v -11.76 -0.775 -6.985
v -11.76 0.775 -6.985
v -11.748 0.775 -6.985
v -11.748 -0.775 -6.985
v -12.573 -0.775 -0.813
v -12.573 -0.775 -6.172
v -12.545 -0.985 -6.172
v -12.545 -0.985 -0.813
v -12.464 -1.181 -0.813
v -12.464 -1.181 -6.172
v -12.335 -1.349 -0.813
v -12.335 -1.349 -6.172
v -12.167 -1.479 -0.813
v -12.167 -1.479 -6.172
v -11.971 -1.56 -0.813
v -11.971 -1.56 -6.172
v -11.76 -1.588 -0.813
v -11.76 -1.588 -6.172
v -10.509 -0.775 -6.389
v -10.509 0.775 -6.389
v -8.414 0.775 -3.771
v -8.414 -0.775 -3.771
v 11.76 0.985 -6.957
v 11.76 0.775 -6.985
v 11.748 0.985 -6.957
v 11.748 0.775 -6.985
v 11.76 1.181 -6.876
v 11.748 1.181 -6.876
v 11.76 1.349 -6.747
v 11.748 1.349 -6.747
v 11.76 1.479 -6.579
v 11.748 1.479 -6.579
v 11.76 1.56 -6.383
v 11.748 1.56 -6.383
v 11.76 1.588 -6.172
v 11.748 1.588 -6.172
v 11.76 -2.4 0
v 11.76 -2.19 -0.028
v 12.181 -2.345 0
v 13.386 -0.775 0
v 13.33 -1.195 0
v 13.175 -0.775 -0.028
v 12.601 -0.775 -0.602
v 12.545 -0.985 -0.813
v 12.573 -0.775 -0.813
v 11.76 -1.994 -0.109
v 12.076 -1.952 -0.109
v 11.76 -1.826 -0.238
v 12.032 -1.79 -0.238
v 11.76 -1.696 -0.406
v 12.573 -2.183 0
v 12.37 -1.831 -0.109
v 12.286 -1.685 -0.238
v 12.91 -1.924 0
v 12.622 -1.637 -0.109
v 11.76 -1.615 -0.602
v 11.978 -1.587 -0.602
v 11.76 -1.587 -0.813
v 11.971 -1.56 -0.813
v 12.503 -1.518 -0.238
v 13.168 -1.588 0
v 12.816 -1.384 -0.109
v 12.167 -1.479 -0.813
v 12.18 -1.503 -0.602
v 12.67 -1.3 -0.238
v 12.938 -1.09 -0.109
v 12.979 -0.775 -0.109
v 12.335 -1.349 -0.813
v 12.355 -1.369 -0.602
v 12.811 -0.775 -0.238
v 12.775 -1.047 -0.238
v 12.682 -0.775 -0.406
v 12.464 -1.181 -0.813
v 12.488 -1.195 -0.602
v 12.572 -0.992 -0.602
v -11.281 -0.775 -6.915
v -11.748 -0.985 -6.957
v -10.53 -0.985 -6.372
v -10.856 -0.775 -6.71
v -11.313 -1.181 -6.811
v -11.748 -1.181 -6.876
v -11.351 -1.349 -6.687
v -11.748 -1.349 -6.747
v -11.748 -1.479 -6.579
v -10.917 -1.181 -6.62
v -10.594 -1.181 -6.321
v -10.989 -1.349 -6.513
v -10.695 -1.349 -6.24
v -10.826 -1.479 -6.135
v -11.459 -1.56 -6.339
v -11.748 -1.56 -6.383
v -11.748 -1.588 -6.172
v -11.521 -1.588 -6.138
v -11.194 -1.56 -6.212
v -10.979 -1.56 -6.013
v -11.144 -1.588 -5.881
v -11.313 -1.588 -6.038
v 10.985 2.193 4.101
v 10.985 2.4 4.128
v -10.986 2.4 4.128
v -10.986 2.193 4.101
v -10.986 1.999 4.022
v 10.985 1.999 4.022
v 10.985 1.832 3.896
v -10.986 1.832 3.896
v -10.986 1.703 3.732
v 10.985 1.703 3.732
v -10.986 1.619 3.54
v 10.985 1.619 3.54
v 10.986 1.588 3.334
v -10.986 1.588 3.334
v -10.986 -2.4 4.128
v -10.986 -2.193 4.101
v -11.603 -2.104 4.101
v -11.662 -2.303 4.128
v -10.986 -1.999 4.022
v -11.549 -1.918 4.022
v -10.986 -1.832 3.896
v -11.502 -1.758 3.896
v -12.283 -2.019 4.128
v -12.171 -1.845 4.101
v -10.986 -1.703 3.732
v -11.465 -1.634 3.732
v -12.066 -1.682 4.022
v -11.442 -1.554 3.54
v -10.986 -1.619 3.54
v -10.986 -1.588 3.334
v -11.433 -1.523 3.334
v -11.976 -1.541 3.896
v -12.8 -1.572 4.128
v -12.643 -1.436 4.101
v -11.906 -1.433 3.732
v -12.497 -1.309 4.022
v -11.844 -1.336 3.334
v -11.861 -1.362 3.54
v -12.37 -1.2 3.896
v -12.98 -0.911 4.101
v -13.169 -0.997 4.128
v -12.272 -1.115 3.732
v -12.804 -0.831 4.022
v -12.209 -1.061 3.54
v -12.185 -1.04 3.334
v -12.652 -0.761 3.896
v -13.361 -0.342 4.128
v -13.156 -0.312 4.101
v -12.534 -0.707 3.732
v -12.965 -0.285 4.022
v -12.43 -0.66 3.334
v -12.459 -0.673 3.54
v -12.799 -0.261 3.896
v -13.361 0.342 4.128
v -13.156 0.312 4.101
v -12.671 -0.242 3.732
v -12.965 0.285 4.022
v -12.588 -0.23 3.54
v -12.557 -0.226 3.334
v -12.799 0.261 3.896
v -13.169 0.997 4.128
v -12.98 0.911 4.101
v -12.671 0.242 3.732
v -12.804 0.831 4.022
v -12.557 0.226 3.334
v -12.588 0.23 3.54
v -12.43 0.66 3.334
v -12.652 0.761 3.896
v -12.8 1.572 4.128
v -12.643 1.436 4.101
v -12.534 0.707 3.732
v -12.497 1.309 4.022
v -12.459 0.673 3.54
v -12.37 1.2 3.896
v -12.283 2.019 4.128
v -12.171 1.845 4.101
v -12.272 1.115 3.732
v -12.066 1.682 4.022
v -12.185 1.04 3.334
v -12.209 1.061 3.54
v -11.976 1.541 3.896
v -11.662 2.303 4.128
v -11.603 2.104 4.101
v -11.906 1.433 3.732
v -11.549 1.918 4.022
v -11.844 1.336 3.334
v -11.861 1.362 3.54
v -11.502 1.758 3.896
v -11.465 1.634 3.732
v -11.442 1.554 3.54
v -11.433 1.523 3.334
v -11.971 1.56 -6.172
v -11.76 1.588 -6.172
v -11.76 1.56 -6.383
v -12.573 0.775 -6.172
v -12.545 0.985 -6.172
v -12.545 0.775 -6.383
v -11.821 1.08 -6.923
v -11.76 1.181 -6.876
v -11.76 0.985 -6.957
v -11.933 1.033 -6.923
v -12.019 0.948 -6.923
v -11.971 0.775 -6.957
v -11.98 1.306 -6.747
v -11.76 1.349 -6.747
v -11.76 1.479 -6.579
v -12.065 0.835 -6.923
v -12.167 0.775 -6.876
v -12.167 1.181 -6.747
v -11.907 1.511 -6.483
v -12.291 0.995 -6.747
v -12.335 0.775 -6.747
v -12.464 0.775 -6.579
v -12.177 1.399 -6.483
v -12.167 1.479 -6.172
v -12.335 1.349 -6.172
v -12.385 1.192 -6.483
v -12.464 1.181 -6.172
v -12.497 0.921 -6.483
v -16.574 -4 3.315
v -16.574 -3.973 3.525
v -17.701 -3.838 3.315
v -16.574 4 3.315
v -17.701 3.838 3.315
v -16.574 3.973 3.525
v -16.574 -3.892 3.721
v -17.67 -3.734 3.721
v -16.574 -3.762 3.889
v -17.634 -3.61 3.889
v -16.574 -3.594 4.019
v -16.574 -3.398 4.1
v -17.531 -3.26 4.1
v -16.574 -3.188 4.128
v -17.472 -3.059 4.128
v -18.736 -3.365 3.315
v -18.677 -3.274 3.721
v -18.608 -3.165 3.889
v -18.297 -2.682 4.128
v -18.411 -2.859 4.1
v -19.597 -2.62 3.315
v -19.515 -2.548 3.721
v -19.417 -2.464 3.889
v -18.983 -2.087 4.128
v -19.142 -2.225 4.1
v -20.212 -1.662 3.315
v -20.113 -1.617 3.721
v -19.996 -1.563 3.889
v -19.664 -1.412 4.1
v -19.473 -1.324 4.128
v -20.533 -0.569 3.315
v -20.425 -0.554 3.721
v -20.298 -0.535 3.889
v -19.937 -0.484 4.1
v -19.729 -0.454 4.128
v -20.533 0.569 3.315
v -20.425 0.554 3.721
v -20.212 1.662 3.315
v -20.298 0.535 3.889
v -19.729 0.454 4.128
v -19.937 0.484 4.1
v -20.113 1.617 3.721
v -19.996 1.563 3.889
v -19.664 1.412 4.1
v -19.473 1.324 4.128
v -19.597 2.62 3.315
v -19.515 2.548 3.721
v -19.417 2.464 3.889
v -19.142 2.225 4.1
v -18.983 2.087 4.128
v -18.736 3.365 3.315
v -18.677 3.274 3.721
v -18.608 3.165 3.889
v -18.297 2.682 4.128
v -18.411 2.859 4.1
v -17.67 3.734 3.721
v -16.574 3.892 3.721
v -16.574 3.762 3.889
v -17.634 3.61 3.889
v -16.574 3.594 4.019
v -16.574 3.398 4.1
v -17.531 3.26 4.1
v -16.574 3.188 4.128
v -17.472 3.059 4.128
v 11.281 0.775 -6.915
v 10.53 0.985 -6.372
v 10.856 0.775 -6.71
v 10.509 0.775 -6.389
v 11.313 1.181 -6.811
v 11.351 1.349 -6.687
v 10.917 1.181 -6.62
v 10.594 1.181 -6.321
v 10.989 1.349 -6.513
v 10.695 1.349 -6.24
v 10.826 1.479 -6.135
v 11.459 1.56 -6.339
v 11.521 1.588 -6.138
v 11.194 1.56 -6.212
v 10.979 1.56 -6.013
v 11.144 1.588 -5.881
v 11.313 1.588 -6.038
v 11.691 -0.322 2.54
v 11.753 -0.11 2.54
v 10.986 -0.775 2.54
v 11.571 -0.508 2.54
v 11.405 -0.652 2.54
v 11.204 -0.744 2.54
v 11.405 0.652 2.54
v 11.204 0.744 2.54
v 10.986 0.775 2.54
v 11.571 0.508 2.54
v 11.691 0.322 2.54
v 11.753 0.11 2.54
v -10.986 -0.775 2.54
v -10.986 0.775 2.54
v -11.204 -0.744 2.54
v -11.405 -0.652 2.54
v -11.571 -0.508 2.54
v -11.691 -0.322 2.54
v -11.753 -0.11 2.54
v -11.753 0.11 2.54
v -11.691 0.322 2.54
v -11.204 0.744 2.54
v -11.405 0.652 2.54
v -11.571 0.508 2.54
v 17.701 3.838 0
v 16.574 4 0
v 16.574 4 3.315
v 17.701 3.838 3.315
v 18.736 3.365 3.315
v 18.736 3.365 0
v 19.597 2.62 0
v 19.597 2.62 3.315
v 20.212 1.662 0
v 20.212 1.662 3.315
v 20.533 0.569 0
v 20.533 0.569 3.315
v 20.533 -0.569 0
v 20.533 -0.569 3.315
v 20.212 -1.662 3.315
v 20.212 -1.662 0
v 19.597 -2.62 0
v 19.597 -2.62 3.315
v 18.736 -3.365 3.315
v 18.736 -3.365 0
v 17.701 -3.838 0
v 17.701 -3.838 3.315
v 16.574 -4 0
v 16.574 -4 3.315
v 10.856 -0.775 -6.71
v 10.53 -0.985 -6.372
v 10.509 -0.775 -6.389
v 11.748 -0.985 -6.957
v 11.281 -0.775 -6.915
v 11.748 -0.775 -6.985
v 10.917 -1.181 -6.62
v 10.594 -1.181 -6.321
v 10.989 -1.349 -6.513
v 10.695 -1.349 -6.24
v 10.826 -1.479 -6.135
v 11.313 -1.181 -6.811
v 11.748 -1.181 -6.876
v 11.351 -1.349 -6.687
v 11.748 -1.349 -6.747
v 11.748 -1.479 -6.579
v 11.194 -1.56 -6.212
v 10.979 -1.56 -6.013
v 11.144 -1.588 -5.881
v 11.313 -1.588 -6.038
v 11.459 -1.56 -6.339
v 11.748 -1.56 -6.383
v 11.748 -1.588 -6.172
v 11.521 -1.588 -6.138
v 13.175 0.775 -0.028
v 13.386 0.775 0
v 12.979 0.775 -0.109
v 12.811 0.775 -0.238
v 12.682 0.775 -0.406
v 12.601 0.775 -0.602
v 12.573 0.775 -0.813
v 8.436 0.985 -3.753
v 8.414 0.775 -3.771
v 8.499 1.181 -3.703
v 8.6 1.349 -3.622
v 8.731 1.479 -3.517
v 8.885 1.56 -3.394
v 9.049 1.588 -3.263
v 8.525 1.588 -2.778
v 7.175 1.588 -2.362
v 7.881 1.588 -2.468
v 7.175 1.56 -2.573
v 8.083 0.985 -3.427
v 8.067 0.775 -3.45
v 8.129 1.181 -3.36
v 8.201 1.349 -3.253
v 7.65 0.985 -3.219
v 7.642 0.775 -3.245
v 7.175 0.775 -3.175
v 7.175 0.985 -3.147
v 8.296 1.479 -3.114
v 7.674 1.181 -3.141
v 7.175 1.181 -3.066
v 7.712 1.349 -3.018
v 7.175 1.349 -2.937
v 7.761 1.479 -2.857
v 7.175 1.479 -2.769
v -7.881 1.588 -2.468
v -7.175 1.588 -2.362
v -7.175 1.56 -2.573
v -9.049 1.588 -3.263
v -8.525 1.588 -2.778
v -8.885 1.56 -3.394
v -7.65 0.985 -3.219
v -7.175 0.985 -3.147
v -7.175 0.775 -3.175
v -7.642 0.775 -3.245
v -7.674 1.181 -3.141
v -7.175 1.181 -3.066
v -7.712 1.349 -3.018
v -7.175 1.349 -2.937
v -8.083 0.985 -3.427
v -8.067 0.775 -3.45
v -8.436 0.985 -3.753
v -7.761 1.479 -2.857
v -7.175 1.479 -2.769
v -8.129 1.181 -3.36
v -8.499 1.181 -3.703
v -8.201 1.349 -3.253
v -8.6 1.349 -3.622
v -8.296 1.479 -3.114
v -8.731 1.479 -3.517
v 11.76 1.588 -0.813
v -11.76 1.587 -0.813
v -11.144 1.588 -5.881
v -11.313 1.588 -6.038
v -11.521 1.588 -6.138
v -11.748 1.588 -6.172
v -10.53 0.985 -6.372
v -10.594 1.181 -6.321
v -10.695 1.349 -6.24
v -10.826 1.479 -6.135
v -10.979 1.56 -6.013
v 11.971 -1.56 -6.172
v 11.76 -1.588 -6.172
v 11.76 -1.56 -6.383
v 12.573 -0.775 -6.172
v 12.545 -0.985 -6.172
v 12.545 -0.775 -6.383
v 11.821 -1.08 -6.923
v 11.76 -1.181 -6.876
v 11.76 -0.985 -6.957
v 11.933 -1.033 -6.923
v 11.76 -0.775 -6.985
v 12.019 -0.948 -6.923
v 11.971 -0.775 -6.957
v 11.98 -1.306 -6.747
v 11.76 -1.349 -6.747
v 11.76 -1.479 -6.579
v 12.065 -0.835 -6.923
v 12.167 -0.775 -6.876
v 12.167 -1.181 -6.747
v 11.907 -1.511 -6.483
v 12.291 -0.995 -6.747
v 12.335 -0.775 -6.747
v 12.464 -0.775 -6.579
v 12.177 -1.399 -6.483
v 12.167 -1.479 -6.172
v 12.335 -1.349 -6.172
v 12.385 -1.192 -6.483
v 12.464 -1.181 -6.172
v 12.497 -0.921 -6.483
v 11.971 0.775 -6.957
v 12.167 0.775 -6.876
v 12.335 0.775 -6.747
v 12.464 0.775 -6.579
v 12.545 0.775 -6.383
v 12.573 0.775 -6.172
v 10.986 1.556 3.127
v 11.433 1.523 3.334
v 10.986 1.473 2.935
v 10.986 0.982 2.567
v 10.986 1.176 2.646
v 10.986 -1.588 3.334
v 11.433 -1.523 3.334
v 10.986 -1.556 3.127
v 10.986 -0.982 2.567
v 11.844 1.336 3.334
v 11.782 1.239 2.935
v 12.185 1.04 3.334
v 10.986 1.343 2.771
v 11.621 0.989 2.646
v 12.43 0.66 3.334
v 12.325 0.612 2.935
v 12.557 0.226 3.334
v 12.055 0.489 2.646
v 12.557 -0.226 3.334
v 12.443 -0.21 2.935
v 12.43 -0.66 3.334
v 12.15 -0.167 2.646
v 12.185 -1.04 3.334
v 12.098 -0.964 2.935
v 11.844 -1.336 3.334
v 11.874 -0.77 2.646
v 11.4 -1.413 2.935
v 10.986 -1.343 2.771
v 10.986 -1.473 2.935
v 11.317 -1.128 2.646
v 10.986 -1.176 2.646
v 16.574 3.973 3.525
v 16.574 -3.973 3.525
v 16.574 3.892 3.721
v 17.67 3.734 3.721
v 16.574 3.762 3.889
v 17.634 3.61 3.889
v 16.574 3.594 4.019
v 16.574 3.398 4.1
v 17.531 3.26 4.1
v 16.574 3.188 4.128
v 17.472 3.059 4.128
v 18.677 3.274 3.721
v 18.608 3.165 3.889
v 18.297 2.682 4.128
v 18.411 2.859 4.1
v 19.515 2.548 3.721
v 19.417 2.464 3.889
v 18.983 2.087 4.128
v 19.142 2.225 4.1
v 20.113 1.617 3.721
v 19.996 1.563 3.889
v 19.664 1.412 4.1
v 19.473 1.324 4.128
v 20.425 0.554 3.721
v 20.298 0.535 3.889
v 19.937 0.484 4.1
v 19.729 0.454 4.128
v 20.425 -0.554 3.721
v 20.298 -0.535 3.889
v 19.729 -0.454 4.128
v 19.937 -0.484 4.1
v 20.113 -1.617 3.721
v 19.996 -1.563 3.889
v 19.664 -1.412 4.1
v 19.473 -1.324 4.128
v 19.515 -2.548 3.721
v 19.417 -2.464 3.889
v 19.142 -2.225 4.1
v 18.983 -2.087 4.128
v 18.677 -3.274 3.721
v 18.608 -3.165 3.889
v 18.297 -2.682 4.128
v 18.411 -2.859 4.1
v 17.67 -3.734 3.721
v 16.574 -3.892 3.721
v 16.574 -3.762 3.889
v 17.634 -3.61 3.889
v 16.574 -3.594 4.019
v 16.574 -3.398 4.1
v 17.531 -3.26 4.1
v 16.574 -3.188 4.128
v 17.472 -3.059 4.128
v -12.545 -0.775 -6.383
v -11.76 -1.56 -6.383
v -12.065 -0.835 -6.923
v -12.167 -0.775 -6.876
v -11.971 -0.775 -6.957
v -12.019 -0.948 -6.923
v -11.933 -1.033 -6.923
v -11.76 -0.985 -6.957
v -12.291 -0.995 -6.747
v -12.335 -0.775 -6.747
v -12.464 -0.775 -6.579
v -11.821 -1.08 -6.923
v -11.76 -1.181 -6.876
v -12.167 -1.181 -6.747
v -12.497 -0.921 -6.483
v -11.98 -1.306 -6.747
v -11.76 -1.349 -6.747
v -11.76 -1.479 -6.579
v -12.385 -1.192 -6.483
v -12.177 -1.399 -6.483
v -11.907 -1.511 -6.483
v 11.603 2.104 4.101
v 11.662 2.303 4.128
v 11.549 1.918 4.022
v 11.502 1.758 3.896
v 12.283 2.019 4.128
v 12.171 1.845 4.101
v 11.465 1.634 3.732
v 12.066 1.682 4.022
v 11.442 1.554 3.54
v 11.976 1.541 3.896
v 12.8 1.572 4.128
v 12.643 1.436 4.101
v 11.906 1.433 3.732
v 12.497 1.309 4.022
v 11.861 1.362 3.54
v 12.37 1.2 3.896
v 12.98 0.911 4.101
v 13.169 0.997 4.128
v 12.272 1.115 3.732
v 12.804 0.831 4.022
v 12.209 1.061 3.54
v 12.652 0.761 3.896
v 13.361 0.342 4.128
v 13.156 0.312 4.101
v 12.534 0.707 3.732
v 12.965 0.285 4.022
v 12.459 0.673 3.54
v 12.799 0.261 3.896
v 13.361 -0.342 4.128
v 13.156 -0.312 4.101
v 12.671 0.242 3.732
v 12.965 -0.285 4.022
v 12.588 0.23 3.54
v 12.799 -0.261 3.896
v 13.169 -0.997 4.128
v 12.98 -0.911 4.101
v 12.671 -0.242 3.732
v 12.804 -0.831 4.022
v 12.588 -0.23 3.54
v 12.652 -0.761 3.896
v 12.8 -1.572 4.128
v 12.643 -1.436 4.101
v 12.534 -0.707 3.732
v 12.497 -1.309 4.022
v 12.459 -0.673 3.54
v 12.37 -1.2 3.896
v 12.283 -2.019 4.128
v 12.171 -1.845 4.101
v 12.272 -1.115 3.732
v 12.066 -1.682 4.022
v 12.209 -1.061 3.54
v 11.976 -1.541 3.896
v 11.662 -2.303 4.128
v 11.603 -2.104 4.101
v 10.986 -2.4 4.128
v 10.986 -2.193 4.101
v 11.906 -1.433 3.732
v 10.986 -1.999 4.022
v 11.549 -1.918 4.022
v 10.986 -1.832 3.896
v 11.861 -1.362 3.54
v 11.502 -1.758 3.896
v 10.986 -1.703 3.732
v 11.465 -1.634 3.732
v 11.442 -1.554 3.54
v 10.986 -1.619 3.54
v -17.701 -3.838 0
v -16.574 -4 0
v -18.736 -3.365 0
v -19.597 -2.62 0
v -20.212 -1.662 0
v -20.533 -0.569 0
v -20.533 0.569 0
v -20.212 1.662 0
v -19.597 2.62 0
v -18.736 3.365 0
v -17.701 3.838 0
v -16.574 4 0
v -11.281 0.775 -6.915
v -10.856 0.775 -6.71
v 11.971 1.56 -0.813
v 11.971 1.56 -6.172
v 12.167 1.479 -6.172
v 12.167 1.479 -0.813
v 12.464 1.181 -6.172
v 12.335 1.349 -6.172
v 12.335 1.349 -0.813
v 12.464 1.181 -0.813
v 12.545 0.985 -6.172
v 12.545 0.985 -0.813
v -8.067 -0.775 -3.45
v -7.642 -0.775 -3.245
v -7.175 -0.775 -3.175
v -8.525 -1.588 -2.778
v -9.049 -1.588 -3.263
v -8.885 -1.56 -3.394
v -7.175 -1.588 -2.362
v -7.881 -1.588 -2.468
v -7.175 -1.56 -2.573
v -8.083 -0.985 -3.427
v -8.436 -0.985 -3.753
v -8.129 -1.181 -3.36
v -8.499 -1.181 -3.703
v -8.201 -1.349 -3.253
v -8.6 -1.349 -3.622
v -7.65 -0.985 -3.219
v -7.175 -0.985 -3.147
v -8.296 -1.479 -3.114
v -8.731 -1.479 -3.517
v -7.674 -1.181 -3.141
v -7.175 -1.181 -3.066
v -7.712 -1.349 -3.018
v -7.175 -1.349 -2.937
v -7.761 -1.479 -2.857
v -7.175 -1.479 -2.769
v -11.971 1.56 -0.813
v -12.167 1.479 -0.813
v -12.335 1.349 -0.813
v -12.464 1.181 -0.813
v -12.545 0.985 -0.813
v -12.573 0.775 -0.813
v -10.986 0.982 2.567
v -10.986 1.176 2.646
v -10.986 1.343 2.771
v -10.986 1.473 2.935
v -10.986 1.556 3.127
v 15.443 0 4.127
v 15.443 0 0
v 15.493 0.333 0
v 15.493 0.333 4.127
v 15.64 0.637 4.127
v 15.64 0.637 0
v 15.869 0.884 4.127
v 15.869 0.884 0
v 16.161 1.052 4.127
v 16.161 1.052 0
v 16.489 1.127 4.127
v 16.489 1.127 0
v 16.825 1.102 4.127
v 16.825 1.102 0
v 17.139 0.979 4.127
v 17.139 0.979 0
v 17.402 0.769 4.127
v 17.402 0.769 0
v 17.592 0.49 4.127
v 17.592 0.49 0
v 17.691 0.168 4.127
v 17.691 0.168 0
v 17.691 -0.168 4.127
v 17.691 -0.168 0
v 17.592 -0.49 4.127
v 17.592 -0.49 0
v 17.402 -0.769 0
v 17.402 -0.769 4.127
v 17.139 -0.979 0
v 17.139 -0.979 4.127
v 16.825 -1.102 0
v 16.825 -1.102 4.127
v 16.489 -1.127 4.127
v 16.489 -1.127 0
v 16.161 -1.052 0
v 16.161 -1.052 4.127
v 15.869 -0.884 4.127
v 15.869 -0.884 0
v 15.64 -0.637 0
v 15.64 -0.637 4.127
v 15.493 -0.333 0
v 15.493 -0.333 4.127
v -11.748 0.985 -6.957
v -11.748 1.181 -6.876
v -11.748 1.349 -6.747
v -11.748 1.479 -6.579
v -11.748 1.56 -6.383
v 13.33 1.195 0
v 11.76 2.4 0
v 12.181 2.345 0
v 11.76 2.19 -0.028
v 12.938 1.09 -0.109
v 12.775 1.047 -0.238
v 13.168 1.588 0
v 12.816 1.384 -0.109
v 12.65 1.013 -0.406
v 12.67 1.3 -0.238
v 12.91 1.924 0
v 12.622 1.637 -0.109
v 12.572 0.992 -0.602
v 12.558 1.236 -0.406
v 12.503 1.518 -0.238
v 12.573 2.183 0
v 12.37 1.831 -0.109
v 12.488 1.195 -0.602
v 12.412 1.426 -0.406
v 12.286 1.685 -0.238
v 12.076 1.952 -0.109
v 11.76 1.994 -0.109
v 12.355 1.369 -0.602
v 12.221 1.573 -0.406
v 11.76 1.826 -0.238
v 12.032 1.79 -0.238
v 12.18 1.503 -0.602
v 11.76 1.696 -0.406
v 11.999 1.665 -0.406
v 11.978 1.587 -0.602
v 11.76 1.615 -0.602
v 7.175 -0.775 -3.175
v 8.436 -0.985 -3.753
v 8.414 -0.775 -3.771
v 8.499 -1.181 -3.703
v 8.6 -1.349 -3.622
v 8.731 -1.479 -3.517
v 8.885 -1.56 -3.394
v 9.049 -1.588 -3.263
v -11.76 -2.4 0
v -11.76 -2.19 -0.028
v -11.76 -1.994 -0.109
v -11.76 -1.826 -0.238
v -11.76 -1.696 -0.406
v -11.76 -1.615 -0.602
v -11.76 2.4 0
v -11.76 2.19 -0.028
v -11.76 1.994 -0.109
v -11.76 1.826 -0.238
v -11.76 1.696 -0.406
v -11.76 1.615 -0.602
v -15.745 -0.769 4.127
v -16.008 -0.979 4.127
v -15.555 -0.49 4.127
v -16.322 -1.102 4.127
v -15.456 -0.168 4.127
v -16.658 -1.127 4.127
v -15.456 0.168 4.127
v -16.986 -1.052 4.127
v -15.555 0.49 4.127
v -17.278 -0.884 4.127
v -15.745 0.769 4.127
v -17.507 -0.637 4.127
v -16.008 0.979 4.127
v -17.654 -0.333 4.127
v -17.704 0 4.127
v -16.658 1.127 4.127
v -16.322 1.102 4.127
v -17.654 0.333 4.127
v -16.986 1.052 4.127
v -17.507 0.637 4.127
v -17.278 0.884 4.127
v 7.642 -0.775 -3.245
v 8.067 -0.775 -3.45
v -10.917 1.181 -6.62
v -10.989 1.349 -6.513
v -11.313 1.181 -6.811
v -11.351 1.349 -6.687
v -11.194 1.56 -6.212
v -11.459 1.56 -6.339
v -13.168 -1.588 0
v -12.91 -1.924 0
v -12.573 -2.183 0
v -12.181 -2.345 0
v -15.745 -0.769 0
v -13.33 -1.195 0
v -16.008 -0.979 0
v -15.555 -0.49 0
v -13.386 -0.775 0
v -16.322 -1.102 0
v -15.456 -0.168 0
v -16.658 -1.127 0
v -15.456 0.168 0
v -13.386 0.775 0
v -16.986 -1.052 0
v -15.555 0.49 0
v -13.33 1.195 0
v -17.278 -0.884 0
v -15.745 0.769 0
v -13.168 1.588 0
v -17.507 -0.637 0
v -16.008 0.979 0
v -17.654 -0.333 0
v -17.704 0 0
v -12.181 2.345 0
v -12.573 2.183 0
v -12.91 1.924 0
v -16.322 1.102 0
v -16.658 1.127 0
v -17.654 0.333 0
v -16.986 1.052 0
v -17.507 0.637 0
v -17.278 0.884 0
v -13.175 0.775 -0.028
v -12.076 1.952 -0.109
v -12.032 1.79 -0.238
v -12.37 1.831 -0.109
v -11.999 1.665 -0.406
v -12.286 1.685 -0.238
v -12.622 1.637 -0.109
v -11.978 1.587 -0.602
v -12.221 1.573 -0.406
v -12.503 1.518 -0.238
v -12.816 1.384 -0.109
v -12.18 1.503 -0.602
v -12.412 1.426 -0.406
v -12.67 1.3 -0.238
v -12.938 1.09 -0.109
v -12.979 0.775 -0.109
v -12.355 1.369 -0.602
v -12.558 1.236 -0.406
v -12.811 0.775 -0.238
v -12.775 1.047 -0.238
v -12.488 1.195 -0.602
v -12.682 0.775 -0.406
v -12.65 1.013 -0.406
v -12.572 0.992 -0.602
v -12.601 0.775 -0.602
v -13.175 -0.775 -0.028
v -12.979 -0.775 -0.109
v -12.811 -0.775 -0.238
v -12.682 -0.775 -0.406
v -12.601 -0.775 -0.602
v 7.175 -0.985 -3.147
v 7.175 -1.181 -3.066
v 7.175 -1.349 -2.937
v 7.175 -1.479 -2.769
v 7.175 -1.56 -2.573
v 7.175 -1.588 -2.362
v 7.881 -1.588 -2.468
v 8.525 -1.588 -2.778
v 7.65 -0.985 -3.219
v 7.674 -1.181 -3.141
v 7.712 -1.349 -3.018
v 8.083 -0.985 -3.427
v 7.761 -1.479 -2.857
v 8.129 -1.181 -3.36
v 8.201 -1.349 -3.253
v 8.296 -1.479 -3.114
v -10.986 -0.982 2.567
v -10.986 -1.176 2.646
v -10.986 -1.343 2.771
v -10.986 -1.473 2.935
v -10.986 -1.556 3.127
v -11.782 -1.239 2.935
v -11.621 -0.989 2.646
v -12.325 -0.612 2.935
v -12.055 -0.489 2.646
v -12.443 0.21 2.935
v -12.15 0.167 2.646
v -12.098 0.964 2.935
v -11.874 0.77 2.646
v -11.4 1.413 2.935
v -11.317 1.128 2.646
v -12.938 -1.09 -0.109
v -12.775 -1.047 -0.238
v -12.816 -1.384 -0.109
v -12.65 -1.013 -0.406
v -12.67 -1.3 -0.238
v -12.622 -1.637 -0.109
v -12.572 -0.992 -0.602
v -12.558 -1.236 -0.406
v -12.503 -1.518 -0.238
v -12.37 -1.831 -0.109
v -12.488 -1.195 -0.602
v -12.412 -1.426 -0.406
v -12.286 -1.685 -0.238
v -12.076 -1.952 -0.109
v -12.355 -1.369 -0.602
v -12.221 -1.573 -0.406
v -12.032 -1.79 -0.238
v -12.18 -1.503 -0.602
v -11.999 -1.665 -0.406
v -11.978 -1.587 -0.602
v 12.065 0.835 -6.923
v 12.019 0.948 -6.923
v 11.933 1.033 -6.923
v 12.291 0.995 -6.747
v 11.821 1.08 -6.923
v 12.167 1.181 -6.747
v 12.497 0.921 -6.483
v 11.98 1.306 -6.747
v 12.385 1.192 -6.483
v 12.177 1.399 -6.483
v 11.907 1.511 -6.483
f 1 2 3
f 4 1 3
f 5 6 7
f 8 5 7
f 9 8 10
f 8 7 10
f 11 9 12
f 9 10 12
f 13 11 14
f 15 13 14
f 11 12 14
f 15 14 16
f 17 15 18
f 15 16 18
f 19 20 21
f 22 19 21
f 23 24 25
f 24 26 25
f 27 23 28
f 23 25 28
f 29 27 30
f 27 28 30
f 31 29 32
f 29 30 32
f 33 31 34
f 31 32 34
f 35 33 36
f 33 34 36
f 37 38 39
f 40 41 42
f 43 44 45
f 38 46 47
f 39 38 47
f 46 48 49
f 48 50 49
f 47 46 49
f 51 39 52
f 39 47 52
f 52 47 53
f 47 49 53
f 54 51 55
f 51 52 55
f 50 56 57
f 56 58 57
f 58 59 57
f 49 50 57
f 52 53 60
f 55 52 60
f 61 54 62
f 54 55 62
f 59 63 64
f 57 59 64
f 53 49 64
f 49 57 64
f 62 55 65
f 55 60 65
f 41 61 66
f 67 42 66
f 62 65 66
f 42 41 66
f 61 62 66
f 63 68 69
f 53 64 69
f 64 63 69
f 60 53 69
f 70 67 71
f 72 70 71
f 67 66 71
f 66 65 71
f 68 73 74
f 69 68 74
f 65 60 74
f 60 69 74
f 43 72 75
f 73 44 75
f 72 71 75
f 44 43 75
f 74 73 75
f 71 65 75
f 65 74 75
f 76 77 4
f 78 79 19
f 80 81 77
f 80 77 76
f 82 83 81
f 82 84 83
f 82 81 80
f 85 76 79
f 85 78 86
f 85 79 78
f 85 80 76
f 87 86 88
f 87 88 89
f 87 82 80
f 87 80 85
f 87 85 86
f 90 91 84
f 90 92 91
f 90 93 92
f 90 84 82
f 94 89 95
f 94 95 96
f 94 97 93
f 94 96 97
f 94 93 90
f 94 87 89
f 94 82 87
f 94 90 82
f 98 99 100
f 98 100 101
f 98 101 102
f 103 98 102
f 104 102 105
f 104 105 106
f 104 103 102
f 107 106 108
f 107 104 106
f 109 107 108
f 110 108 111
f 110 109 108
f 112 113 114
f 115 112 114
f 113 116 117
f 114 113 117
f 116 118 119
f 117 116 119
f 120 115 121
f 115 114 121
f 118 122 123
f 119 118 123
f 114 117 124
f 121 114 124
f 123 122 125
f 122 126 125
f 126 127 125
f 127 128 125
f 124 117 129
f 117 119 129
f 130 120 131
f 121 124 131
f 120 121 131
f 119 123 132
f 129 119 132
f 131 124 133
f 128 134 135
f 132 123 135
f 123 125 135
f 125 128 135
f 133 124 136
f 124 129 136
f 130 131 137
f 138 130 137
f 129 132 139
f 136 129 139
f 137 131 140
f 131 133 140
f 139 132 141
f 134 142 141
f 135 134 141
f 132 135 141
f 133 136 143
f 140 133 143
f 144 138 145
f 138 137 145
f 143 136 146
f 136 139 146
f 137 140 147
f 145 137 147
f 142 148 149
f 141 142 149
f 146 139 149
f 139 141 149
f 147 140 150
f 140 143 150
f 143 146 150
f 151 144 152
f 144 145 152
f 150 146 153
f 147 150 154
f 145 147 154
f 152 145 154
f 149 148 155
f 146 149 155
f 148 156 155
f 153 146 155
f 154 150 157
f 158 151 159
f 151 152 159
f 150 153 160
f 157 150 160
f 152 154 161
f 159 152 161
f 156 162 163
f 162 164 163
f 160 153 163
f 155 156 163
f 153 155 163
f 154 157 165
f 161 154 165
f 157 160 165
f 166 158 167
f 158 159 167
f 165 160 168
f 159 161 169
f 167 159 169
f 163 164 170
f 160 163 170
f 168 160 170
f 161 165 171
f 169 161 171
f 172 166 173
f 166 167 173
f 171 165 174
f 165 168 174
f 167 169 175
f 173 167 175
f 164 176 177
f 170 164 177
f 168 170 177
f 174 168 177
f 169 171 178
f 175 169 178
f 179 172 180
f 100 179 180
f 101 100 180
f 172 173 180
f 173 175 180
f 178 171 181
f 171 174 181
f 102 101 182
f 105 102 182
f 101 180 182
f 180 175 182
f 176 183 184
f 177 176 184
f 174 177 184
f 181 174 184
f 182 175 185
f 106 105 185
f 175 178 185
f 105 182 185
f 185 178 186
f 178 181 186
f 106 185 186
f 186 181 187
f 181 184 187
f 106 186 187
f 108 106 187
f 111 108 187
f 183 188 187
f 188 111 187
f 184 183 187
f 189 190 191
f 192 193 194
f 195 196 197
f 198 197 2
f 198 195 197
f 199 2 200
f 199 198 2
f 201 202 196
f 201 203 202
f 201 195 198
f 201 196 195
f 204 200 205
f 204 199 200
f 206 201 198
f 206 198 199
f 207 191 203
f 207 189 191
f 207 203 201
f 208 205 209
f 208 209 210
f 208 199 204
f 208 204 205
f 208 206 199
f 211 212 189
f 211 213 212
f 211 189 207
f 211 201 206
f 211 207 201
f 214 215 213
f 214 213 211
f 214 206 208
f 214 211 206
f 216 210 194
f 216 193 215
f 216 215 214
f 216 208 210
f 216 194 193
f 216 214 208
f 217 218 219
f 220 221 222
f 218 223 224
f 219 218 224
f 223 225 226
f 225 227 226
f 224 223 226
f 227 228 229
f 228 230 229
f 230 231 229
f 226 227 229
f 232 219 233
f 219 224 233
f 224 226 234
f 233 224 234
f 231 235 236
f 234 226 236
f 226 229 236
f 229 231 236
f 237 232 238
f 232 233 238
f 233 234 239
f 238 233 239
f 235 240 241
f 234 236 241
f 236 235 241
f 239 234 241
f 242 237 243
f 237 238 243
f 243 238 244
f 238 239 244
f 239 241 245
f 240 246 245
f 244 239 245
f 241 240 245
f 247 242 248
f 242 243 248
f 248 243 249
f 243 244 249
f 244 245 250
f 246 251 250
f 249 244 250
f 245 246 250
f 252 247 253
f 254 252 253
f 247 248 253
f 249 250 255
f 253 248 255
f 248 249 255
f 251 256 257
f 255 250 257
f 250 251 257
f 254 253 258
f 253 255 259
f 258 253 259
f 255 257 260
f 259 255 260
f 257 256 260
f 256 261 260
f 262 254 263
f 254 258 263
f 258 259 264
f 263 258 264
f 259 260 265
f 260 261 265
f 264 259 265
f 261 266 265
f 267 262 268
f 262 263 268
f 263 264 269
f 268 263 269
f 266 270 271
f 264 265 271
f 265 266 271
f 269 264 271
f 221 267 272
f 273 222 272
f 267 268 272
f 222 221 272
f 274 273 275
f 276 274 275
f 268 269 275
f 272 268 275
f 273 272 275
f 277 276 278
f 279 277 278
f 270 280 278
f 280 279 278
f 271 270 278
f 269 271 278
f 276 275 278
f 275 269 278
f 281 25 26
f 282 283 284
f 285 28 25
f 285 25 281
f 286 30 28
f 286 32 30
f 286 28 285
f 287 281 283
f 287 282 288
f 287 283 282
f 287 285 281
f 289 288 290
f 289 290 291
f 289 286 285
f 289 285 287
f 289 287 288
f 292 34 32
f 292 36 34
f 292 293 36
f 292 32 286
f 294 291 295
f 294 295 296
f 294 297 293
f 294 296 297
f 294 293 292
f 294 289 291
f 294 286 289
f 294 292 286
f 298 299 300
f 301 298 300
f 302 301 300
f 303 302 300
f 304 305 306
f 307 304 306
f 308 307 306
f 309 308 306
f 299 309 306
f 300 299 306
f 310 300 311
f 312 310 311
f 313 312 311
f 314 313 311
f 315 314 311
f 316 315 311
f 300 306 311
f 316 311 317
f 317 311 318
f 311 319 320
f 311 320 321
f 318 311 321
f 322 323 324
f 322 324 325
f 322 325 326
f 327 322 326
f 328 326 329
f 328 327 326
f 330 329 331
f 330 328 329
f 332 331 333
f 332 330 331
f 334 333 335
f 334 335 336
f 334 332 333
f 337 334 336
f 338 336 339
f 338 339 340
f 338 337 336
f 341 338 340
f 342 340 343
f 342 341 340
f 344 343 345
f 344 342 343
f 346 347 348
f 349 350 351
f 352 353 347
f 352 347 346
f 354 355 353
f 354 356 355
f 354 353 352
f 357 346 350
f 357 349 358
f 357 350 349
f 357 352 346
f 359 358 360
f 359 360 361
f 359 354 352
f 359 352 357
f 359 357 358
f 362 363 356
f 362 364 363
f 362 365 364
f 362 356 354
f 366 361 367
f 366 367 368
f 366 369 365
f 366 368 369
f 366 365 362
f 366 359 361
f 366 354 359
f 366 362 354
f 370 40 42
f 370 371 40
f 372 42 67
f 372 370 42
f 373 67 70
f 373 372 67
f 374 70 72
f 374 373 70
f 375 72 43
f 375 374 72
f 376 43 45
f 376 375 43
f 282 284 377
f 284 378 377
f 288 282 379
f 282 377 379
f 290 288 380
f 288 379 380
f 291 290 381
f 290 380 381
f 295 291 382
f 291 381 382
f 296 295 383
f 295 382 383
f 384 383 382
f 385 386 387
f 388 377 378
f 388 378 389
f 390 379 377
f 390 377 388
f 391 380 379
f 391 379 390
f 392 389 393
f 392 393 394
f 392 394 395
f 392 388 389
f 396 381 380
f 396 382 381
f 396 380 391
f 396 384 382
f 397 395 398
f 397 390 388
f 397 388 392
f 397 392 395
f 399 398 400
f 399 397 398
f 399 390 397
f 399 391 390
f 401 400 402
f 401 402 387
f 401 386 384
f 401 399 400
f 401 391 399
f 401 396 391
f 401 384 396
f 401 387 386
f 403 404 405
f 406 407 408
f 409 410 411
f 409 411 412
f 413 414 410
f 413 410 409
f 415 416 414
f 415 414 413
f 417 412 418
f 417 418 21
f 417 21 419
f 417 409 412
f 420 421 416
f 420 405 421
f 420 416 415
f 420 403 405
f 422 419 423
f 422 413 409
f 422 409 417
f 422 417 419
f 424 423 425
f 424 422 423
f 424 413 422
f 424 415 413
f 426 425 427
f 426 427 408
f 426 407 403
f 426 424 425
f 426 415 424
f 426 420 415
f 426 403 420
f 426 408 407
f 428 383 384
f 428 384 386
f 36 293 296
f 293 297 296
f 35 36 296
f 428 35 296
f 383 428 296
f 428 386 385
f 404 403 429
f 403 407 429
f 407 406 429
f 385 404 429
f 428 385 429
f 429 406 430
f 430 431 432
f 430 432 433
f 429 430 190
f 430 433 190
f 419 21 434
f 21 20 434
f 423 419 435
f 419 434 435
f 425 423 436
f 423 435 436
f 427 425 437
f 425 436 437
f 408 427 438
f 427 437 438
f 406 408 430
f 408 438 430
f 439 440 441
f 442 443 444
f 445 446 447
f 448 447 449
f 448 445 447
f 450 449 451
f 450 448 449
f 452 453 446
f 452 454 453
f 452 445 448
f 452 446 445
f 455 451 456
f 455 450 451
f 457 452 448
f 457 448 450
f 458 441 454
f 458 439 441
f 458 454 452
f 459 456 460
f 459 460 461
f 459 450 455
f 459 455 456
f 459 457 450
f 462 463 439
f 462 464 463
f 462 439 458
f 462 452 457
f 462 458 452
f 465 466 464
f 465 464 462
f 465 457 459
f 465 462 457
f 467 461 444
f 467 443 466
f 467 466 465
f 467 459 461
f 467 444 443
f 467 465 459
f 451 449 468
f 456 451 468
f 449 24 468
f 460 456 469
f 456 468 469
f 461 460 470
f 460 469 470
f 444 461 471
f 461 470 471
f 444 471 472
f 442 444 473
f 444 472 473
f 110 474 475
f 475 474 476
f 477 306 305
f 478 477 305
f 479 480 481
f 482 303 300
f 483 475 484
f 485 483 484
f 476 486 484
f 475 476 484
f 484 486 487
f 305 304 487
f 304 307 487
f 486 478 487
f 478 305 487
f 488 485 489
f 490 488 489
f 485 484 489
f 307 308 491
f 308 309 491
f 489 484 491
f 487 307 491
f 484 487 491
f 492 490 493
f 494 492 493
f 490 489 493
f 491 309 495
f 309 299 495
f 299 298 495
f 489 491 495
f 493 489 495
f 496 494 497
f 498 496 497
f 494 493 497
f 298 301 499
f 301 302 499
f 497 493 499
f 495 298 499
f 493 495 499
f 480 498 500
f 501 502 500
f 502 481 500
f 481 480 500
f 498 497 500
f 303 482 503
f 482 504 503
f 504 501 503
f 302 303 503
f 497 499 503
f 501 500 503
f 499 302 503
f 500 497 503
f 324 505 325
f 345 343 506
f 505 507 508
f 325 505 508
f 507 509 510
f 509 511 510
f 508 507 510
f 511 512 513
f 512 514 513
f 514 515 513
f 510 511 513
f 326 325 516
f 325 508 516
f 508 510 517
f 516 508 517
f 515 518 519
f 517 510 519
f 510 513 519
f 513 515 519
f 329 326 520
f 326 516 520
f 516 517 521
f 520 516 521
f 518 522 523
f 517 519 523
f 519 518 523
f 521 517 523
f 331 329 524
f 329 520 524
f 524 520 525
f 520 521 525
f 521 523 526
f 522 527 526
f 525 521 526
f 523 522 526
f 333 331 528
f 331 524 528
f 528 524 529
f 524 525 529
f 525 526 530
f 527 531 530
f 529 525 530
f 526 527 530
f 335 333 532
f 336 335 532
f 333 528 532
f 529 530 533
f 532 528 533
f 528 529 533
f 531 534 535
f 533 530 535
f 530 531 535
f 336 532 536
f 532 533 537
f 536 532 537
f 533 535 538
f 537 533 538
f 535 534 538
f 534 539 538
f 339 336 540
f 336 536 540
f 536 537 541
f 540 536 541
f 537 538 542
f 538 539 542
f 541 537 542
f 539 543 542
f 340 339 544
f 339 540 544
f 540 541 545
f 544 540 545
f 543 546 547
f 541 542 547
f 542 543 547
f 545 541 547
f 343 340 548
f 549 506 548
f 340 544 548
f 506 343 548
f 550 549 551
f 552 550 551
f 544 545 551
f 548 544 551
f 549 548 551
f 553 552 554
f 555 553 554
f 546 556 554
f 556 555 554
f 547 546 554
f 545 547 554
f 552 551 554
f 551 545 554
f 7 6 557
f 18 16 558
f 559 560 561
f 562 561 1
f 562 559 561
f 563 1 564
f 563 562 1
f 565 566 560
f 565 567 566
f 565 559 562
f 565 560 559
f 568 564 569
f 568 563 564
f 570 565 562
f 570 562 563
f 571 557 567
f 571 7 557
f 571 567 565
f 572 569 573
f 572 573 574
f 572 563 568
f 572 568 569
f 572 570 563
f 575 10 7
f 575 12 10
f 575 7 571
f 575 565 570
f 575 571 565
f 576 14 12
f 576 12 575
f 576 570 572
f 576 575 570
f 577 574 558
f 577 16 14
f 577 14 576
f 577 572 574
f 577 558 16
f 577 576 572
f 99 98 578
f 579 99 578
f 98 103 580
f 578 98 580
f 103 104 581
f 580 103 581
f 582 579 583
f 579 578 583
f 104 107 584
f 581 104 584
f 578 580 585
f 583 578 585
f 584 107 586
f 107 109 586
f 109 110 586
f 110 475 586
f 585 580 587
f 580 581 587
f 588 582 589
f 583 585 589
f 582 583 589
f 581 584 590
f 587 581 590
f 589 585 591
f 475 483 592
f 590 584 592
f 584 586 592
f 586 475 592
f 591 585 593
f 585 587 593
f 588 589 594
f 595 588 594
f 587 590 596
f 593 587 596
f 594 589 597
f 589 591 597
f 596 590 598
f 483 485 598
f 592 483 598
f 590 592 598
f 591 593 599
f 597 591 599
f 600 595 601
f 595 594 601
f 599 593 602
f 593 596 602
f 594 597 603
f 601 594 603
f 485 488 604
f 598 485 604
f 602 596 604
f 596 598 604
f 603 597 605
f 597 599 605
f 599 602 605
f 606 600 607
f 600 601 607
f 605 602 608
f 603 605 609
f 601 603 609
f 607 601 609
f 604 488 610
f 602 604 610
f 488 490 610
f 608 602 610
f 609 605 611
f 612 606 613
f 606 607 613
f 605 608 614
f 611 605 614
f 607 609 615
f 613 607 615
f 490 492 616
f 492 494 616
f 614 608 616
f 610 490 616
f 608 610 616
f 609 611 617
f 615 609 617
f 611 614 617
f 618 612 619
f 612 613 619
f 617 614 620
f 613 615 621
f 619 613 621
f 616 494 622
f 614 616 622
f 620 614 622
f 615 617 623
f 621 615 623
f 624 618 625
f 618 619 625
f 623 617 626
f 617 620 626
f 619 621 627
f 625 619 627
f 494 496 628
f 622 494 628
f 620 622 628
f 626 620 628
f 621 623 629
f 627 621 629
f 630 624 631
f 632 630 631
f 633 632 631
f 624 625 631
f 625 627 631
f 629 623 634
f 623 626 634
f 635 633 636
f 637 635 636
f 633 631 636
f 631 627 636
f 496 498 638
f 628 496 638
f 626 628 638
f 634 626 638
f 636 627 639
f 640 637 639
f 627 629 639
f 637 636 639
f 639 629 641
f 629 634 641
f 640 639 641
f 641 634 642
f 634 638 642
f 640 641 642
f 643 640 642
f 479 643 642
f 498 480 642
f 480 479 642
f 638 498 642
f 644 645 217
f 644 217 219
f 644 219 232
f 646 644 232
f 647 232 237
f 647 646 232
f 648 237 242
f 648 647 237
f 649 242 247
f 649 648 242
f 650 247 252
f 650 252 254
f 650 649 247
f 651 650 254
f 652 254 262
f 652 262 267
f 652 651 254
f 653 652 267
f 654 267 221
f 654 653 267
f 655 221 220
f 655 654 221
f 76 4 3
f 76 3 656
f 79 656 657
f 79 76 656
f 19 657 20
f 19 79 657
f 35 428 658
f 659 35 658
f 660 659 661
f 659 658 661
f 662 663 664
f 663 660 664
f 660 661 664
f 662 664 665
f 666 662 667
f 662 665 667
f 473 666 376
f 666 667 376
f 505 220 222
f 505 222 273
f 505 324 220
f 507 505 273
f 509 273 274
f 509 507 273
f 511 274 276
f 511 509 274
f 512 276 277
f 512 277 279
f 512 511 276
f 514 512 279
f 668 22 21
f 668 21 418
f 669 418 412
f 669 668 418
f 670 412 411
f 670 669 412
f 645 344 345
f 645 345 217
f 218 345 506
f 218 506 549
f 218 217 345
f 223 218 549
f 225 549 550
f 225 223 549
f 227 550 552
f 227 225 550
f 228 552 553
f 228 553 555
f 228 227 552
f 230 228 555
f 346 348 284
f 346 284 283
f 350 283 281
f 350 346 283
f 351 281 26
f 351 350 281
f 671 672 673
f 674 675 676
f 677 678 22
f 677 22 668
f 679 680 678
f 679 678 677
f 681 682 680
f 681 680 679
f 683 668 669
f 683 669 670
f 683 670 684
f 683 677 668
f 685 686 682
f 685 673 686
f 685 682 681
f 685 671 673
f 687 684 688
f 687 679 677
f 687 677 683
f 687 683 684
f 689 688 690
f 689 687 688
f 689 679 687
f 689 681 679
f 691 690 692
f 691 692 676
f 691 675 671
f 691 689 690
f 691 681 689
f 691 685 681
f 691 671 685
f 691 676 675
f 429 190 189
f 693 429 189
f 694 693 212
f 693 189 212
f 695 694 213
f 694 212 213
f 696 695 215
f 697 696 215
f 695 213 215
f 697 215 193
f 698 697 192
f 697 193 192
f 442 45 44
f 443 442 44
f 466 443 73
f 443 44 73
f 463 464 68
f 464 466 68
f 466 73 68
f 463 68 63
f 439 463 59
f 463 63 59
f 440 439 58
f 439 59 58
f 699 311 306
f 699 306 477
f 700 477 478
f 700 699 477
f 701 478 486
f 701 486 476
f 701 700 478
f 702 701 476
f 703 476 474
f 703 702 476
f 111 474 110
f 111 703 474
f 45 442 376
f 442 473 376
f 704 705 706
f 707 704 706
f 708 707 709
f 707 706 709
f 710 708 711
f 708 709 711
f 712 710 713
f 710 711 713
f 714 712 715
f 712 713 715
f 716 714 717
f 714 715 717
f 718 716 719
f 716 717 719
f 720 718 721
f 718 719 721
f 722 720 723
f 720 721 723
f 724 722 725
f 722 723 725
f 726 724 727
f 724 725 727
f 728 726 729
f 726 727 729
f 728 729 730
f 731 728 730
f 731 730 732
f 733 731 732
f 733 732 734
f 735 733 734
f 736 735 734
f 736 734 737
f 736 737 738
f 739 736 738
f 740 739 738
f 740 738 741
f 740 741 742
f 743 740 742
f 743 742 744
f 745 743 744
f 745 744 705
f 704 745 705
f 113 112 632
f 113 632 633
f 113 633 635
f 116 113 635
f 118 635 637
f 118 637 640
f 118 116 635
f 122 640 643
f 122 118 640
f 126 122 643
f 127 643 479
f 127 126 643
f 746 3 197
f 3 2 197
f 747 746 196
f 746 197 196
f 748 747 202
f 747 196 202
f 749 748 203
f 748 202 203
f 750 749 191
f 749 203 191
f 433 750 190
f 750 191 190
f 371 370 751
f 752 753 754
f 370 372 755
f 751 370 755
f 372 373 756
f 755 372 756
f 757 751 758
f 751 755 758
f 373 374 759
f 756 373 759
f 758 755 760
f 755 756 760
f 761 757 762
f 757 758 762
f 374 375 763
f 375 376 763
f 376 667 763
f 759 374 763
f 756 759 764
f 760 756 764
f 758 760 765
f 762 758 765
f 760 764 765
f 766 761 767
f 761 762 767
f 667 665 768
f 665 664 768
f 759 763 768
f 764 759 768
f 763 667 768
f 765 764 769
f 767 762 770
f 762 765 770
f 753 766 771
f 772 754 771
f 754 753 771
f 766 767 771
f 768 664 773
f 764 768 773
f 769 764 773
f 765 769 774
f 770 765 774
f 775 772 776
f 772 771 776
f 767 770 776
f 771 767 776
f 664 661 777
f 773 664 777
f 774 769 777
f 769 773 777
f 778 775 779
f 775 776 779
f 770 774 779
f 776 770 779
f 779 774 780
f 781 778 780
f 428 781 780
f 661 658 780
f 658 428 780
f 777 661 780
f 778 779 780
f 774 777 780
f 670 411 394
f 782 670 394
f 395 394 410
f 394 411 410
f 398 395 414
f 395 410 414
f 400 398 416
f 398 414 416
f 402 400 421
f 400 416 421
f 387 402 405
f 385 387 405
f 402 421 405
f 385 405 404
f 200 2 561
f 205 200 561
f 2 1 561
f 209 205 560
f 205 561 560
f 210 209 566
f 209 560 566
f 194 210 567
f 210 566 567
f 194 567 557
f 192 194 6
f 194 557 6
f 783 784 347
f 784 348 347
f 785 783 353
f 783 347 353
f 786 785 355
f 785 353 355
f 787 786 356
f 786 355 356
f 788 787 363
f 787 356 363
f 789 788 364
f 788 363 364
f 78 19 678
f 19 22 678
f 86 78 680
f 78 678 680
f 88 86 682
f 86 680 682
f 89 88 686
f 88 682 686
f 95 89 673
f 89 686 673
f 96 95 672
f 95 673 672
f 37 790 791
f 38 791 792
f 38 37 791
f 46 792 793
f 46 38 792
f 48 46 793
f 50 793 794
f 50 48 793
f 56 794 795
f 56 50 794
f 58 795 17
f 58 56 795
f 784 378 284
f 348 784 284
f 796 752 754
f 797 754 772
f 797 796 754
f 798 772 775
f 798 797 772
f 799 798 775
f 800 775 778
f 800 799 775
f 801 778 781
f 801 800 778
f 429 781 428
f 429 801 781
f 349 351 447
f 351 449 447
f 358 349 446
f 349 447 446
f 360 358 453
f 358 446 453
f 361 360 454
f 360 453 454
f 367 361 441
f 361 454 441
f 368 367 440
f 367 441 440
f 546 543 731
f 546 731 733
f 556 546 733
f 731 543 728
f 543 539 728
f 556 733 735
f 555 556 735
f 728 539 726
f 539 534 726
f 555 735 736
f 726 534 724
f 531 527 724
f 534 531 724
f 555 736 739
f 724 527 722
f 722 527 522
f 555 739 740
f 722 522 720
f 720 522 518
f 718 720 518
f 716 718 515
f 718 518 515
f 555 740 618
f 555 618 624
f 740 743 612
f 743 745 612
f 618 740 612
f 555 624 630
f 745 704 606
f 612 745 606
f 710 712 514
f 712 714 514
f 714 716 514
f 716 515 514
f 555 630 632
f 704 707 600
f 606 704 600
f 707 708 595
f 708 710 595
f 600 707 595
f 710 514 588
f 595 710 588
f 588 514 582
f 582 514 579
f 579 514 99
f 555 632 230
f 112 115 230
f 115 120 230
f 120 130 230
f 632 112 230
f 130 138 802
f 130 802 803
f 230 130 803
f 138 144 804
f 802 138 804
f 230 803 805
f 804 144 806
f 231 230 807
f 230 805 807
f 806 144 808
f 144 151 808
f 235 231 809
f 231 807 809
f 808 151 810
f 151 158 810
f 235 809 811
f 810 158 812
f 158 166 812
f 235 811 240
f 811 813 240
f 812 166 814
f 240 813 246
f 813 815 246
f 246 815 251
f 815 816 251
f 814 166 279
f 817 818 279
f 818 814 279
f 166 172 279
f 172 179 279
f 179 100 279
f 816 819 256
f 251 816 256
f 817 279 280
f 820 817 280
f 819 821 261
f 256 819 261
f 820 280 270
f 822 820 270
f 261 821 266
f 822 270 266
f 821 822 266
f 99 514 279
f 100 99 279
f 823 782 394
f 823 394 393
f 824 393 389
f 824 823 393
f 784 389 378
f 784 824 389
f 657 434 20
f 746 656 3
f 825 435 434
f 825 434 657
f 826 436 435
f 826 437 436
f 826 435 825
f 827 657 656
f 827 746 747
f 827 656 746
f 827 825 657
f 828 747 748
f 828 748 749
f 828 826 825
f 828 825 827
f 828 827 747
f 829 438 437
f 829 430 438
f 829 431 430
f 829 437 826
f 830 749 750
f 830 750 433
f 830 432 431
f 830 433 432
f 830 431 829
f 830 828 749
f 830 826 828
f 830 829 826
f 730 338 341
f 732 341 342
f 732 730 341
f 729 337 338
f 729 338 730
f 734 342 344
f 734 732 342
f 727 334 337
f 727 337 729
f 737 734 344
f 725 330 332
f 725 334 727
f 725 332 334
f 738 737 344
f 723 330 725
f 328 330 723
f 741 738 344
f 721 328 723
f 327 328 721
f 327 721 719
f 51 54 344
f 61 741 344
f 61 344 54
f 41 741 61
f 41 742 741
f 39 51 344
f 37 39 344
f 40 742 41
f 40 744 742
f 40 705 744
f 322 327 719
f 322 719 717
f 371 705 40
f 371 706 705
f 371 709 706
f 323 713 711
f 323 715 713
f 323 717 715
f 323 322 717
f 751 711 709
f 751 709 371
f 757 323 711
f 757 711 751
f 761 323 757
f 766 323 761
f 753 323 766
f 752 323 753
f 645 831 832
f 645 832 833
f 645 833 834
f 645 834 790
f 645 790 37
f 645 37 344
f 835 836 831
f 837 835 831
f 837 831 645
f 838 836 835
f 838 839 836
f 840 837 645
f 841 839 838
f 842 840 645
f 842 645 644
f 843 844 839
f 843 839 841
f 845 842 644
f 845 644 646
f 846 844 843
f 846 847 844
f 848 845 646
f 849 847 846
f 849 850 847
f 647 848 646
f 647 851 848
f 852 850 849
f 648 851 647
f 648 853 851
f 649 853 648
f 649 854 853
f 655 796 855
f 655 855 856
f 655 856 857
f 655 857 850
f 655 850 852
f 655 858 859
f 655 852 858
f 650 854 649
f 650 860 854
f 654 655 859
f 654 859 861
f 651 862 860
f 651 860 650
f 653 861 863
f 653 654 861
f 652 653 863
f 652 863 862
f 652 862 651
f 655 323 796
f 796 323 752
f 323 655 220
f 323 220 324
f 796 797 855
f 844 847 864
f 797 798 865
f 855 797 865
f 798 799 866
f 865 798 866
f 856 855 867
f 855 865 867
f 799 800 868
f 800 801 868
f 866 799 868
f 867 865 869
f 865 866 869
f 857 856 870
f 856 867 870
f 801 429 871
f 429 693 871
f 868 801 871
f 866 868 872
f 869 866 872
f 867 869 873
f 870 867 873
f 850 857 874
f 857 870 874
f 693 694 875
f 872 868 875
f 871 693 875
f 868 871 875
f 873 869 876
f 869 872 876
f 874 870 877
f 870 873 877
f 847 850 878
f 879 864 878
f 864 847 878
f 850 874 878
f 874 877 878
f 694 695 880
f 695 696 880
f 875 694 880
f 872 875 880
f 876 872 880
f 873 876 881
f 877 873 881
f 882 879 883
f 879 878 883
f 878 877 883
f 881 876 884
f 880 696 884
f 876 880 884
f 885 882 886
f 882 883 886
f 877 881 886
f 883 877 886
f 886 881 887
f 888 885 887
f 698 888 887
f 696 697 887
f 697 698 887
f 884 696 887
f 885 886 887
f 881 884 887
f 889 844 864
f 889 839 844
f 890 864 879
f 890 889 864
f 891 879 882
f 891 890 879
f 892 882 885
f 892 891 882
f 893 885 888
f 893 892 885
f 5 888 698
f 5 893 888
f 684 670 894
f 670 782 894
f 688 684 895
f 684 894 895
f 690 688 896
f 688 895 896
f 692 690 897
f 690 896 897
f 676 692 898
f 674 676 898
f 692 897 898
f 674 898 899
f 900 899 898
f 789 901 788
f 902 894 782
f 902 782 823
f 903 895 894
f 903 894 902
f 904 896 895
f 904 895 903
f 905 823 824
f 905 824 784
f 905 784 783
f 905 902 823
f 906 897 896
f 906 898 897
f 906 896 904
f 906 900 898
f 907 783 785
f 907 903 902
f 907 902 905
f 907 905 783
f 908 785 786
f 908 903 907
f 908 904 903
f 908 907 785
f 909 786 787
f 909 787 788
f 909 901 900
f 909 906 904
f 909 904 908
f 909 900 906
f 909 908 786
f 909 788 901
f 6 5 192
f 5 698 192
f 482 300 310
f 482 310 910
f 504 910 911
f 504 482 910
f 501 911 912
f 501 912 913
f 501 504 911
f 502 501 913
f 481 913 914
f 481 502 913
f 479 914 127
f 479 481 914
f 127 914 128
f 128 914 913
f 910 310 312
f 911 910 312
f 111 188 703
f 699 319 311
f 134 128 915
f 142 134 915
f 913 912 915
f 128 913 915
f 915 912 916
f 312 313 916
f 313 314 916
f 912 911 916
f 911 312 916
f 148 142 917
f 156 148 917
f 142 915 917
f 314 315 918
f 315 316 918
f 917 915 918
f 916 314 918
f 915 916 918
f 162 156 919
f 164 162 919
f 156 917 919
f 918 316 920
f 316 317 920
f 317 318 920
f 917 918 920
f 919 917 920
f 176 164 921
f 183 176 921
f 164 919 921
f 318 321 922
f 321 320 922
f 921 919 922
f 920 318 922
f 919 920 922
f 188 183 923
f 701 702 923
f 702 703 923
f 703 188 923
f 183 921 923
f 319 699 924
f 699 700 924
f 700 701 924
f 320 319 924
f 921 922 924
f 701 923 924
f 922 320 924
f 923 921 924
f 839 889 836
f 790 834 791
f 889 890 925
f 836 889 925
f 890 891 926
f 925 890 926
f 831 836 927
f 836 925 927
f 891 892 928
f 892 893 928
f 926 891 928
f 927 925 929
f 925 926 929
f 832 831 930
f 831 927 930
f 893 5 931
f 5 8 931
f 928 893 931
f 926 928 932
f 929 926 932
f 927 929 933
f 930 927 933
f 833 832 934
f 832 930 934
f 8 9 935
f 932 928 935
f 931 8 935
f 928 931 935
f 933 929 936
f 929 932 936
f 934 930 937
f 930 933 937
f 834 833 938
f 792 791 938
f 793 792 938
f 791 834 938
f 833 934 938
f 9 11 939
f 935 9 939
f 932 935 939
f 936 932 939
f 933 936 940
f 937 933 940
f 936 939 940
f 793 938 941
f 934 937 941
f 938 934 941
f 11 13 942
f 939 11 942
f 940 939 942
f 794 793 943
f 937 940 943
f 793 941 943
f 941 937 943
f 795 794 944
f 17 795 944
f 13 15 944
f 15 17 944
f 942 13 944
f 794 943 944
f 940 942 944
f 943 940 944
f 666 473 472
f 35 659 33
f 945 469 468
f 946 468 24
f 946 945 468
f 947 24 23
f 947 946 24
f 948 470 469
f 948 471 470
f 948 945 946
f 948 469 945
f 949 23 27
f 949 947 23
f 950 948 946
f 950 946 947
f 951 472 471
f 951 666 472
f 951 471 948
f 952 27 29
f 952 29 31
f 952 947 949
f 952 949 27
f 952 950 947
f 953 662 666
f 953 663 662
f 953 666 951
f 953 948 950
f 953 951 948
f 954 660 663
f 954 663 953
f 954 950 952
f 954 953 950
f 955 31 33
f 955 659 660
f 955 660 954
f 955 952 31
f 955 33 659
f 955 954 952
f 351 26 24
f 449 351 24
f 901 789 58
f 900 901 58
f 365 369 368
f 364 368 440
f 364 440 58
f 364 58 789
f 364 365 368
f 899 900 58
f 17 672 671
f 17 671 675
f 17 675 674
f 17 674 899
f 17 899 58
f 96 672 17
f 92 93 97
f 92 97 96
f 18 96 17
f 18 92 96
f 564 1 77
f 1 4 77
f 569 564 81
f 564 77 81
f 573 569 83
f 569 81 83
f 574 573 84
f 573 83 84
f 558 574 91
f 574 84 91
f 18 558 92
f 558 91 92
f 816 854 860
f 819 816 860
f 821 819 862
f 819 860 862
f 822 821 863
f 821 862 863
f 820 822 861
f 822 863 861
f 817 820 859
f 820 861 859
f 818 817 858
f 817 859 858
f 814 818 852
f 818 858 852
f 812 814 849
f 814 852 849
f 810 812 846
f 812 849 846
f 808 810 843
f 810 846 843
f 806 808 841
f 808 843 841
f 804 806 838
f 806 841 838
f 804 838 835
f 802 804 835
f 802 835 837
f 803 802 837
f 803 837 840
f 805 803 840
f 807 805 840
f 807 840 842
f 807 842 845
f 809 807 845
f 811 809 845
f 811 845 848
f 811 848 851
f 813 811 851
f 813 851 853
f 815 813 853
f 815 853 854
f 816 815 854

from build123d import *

# Parameters (mm, degrees)
BOSS_EXTRUDE1_DEPTH   = 4.1275
CUT_EXTRUDE1_DEPTH    = 1.5875
F_4_40_TAPPED_HOLE1_D = 2.2606
BOSS_EXTRUDE2_DEPTH   = 1.5875
FILLET1_R             = 1.5875
FILLET2_R             = 0.8128
FILLET3_R             = 0.8128
FILLET4_R             = 0.8128


with BuildPart() as part:
    # Sketch1 → Boss-Extrude1 (new body)
    with BuildSketch(Plane.XY):
        with BuildLine():
            Line((-16.5735, 4.0005), (16.5735, 4.0005))
            ThreePointArc((16.5735, 4.0005), (20.574, 0), (16.5735, -4.0005))
            Line((16.5735, -4.0005), (-16.5735, -4.0005))
            ThreePointArc((-16.5735, -4.0005), (-20.574, 0), (-16.5735, 4.0005))
        make_face()
    extrude(amount=BOSS_EXTRUDE1_DEPTH)

    # Sketch2 → Cut-Extrude1 (cut)
    with BuildSketch(Plane.XY.offset(4.1275)):
        with BuildLine():
            Line((-10.9855, 1.5875), (10.9855, 1.5875))
            ThreePointArc((10.9855, 1.5875), (12.573, 0), (10.9855, -1.5875))
            Line((10.9855, -1.5875), (-10.9855, -1.5875))
            ThreePointArc((-10.9855, -1.5875), (-12.573, 0), (-10.9855, 1.5875))
        make_face()
    extrude(amount=-CUT_EXTRUDE1_DEPTH, mode=Mode.SUBTRACT)

    # #4-40 Tapped Hole1 (through all)
    with Locations(Plane.XY.offset(4.1275)):
        with Locations((-16.5735, 0), (16.5735, 0)):
            Hole(F_4_40_TAPPED_HOLE1_D / 2)

    # Sketch5 → Boss-Extrude2 (add, symmetric)
    with BuildSketch(Plane(origin=(0, 0, 0), x_dir=(1, 0, 0), z_dir=(0, 1, 0))):
        Polygon((-12.573, 0), (-12.573, 6.985), (-10.9855, 6.985), (-7.9375, 3.175), (7.9375, 3.175), (10.9855, 6.985), (12.573, 6.985), (12.573, 0), align=None)
    extrude(amount=BOSS_EXTRUDE2_DEPTH, both=True)

    # Fillet1
    fillet1_edges = [part.edges().sort_by_distance(p)[0] for p in [
        (10.9855, 0, -6.985),
        (7.9375, 0, -3.175),
        (-7.9375, 0, -3.175),
        (-10.9855, 0, -6.985),
    ]]
    fillet(fillet1_edges, radius=FILLET1_R)

    # Fillet2
    fillet2_edges = [part.edges().sort_by_distance(p)[0] for p in [
        (12.573, -1.5875, -3.4925),
        (-12.573, -1.5875, -3.4925),
        (12.573, 1.5875, -3.4925),
        (-12.573, 1.5875, -3.4925),
    ]]
    fillet(fillet2_edges, radius=FILLET2_R)

    # Fillet3
    fillet3_edges = [part.edges().sort_by_distance(p)[0] for p in [
        (12.573, 0, 0),
        (11.754345973, -1.5875, -6.985),
        (11.754345973, 1.5875, -6.985),
        (12.334936392, 1.349436392, -6.985),
        (12.334936392, -1.349436392, -6.985),
        (0, -1.5875, 0),
        (0, 1.5875, 0),
        (-12.573, 0, 0),
        (-12.573, 0, -6.985),
        (-12.334936392, 1.349436392, -6.985),
        (-12.334936392, -1.349436392, -6.985),
        (12.334936392, -1.349436392, 0),
        (12.334936392, 1.349436392, 0),
        (-12.334936392, -1.349436392, 0),
        (-12.334936392, 1.349436392, 0),
        (-20.574, 0, 4.1275),
        (0, -4.0005, 4.1275),
        (12.573, 0, 4.1275),
        (0, 1.5875, 4.1275),
        (-12.573, 0, 4.1275),
        (0, -1.5875, 4.1275),
        (20.574, 0, 4.1275),
        (-11.754345973, -1.5875, -6.985),
        (-11.754345973, 1.5875, -6.985),
        (-9.4615, -1.5875, -5.08),
        (0, -1.5875, -3.175),
        (9.4615, -1.5875, -5.08),
        (11.060804836, -1.5875, -6.828318888),
        (-11.060804836, -1.5875, -6.828318888),
        (-9.4615, 1.5875, -5.08),
        (9.4615, 1.5875, -5.08),
        (0, 1.5875, -3.175),
        (11.060804836, 1.5875, -6.828318888),
        (-11.060804836, 1.5875, -6.828318888),
        (7.862195164, -1.5875, -3.331681112),
        (7.862195164, 1.5875, -3.331681112),
        (-7.862195164, -1.5875, -3.331681112),
        (-7.862195164, 1.5875, -3.331681112),
        (0, 4.0005, 4.1275),
        (12.573, 0, -6.985),
    ]]
    fillet(fillet3_edges, radius=FILLET3_R)

    # Fillet4
    # the kernel refuses this fillet: 0.8128 mm, written as the material it adds along each edge
    with BuildSketch(Plane(origin=(10.9855, -1.5875, 2.54), x_dir=(0, -0.00028128862329323027, 0.9999999604383545), z_dir=(-1, 0, 0)), Plane(origin=(-10.9855, 1.5875, 2.54), x_dir=(0, 0.00028128862329323027, 0.9999999604383545), z_dir=(1, 0, 0))) as fillet4_piece_1:
        with BuildLine():
            CenterArc((0.812571462, 0.812582054), FILLET4_R, 180.016116651, 88.657007194)
            Line((-0.000228506, 0.812353422), (-0.081508503, 0.812330559))
            Line((-0.081508503, 0.812330559), (-0.081279997, -2.2863e-05))
            Line((-0.081279997, -2.2863e-05), (2.2863e-05, -0.081279997))
            ThreePointArc((2.2863e-05, -0.081279997), (0.774722832, -0.081062082), (0.791867888, -0.081258205))
            Line((0.791867888, -0.081258205), (0.793750031, 0))
        make_face()
    extrude(amount=21.971)
    with BuildSketch(Plane(origin=(-10.9855, 0, 2.54), x_dir=(0, -1, 0), z_dir=(1, 0, 0))) as fillet4_piece_2:
        with BuildLine():
            CenterArc((0.775146546, -0.8128), FILLET4_R, 1.342992806, 88.657007194)
            Line((0.775146546, 0), (0.775146546, 0.08128))
            Line((0.775146546, 0.08128), (1.5875, 0.08128))
            Line((1.5875, 0.08128), (1.66878, 0))
            ThreePointArc((1.66878, 0), (1.66878, -0.7747), (1.668980946, -0.791845))
            Line((1.668980946, -0.791845), (1.587723273, -0.79375))
        make_face()
    revolve(axis=Axis((-10.9855, 0, 2.54), (0, 0, -1)), revolution_arc=180)
    with BuildSketch(Plane(origin=(10.9855, 0, 2.54), x_dir=(0, 1, 0), z_dir=(-1, 0, 0))) as fillet4_piece_3:
        with BuildLine():
            CenterArc((0.775146546, -0.8128), FILLET4_R, 1.342992806, 88.657007194)
            Line((0.775146546, 0), (0.775146546, 0.08128))
            Line((0.775146546, 0.08128), (1.5875, 0.08128))
            Line((1.5875, 0.08128), (1.66878, 0))
            ThreePointArc((1.66878, 0), (1.66878, -0.7747), (1.668980946, -0.791845))
            Line((1.668980946, -0.791845), (1.587723273, -0.79375))
        make_face()
    revolve(axis=Axis((10.9855, 0, 2.54), (0, 0, -1)), revolution_arc=180)


solid = part.part
